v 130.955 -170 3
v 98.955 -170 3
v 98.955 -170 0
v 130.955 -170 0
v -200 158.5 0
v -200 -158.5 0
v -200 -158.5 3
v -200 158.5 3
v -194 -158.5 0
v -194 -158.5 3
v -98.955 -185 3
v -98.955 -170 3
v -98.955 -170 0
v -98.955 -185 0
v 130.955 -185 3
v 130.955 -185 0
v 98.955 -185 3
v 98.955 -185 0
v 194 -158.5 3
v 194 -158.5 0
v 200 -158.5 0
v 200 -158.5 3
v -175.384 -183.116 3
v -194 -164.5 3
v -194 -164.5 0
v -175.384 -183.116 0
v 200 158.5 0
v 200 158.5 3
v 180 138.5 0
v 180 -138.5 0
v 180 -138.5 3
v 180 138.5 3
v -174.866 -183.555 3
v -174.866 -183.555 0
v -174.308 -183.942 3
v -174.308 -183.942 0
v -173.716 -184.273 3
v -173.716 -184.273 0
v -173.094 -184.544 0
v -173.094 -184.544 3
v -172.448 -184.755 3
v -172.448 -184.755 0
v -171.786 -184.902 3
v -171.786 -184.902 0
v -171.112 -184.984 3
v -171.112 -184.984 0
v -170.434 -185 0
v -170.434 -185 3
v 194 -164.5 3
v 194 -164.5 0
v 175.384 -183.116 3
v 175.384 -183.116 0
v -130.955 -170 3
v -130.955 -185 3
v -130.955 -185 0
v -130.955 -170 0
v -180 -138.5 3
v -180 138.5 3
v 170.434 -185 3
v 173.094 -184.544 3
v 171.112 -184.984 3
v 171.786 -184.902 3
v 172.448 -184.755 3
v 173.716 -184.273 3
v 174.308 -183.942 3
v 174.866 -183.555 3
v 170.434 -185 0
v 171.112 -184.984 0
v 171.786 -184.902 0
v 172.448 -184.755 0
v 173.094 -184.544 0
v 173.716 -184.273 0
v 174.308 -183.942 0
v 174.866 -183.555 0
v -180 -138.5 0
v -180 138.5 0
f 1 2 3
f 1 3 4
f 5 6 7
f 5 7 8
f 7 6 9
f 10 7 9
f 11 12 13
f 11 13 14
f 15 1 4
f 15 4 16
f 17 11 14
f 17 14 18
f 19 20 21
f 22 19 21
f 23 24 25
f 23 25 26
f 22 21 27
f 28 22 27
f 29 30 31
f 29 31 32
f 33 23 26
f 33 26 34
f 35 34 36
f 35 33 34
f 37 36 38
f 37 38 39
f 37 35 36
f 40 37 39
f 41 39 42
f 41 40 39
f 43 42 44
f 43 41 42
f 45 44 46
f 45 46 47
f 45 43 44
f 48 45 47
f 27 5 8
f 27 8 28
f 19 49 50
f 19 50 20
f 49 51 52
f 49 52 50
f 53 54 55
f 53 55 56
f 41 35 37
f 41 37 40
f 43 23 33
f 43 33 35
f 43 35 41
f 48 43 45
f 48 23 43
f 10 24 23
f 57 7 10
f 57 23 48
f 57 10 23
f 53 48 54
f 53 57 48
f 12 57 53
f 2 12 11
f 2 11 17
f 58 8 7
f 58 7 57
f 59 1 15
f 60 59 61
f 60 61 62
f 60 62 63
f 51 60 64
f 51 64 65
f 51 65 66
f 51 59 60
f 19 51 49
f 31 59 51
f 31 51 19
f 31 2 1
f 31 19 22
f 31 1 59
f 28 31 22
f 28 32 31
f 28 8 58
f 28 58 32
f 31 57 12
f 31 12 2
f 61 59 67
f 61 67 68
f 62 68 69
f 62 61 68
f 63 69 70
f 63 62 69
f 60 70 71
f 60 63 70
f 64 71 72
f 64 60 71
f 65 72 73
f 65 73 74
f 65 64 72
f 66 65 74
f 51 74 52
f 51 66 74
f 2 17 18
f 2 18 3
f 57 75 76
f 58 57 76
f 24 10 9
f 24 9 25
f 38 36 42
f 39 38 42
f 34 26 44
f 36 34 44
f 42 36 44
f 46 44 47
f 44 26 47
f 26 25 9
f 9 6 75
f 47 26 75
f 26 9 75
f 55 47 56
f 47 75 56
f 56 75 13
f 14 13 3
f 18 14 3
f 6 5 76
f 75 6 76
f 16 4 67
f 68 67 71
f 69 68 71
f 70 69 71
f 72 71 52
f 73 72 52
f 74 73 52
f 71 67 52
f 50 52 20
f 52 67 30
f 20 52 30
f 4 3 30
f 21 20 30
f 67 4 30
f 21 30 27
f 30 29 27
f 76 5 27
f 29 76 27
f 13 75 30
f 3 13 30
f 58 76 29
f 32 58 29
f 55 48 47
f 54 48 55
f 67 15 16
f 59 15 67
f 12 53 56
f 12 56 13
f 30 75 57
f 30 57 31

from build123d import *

# Parameters (mm, degrees)
SKETCH1_W           = 400
SKETCH1_H           = 317
SKETCH1_W_2         = 360
SKETCH1_H_2         = 277
BOSS_EXTRUDE1_DEPTH = 3
BOSS_EXTRUDE4_DEPTH = 3


with BuildPart() as part:
    # Sketch1 → Boss-Extrude1 (new body)
    with BuildSketch(Plane.XY):
        Rectangle(SKETCH1_W, SKETCH1_H)
        Rectangle(SKETCH1_W_2, SKETCH1_H_2, mode=Mode.SUBTRACT)
    extrude(amount=BOSS_EXTRUDE1_DEPTH)

    # Sketch2 → Boss-Extrude4 (add, through all)
    with BuildSketch(Plane.XY.offset(3)):
        with BuildLine():
            Line((-98.955345629, -185), (0, -185))
            Line((0, -185), (0, -158.5))
            Line((0, -158.5), (-194, -158.5))
            Line((-194, -158.5), (-194, -164.5))
            Line((-194, -164.5), (-175.383585865, -183.116414135))
            ThreePointArc((-175.383585865, -183.116414135), (-173.093720589, -184.544378238), (-170.433838397, -185))
            Line((-170.433838397, -185), (-130.955345629, -185))
            Line((-130.955345629, -185), (-130.955345629, -170))
            Line((-130.955345629, -170), (-98.955345629, -170))
            Line((-98.955345629, -170), (-98.955345629, -185))
        make_face()
        with BuildLine():
            Line((130.955345629, -170), (130.955345629, -185))
            Line((130.955345629, -185), (170.433838397, -185))
            ThreePointArc((170.433838397, -185), (173.093720589, -184.544378238), (175.383585865, -183.116414135))
            Line((175.383585865, -183.116414135), (194, -164.5))
            Line((194, -164.5), (194, -158.5))
            Line((194, -158.5), (0, -158.5))
            Line((0, -158.5), (0, -185))
            Line((0, -185), (98.955345629, -185))
            Line((98.955345629, -185), (98.955345629, -170))
            Line((98.955345629, -170), (130.955345629, -170))
        make_face()
    extrude(amount=-BOSS_EXTRUDE4_DEPTH)


solid = part.part
